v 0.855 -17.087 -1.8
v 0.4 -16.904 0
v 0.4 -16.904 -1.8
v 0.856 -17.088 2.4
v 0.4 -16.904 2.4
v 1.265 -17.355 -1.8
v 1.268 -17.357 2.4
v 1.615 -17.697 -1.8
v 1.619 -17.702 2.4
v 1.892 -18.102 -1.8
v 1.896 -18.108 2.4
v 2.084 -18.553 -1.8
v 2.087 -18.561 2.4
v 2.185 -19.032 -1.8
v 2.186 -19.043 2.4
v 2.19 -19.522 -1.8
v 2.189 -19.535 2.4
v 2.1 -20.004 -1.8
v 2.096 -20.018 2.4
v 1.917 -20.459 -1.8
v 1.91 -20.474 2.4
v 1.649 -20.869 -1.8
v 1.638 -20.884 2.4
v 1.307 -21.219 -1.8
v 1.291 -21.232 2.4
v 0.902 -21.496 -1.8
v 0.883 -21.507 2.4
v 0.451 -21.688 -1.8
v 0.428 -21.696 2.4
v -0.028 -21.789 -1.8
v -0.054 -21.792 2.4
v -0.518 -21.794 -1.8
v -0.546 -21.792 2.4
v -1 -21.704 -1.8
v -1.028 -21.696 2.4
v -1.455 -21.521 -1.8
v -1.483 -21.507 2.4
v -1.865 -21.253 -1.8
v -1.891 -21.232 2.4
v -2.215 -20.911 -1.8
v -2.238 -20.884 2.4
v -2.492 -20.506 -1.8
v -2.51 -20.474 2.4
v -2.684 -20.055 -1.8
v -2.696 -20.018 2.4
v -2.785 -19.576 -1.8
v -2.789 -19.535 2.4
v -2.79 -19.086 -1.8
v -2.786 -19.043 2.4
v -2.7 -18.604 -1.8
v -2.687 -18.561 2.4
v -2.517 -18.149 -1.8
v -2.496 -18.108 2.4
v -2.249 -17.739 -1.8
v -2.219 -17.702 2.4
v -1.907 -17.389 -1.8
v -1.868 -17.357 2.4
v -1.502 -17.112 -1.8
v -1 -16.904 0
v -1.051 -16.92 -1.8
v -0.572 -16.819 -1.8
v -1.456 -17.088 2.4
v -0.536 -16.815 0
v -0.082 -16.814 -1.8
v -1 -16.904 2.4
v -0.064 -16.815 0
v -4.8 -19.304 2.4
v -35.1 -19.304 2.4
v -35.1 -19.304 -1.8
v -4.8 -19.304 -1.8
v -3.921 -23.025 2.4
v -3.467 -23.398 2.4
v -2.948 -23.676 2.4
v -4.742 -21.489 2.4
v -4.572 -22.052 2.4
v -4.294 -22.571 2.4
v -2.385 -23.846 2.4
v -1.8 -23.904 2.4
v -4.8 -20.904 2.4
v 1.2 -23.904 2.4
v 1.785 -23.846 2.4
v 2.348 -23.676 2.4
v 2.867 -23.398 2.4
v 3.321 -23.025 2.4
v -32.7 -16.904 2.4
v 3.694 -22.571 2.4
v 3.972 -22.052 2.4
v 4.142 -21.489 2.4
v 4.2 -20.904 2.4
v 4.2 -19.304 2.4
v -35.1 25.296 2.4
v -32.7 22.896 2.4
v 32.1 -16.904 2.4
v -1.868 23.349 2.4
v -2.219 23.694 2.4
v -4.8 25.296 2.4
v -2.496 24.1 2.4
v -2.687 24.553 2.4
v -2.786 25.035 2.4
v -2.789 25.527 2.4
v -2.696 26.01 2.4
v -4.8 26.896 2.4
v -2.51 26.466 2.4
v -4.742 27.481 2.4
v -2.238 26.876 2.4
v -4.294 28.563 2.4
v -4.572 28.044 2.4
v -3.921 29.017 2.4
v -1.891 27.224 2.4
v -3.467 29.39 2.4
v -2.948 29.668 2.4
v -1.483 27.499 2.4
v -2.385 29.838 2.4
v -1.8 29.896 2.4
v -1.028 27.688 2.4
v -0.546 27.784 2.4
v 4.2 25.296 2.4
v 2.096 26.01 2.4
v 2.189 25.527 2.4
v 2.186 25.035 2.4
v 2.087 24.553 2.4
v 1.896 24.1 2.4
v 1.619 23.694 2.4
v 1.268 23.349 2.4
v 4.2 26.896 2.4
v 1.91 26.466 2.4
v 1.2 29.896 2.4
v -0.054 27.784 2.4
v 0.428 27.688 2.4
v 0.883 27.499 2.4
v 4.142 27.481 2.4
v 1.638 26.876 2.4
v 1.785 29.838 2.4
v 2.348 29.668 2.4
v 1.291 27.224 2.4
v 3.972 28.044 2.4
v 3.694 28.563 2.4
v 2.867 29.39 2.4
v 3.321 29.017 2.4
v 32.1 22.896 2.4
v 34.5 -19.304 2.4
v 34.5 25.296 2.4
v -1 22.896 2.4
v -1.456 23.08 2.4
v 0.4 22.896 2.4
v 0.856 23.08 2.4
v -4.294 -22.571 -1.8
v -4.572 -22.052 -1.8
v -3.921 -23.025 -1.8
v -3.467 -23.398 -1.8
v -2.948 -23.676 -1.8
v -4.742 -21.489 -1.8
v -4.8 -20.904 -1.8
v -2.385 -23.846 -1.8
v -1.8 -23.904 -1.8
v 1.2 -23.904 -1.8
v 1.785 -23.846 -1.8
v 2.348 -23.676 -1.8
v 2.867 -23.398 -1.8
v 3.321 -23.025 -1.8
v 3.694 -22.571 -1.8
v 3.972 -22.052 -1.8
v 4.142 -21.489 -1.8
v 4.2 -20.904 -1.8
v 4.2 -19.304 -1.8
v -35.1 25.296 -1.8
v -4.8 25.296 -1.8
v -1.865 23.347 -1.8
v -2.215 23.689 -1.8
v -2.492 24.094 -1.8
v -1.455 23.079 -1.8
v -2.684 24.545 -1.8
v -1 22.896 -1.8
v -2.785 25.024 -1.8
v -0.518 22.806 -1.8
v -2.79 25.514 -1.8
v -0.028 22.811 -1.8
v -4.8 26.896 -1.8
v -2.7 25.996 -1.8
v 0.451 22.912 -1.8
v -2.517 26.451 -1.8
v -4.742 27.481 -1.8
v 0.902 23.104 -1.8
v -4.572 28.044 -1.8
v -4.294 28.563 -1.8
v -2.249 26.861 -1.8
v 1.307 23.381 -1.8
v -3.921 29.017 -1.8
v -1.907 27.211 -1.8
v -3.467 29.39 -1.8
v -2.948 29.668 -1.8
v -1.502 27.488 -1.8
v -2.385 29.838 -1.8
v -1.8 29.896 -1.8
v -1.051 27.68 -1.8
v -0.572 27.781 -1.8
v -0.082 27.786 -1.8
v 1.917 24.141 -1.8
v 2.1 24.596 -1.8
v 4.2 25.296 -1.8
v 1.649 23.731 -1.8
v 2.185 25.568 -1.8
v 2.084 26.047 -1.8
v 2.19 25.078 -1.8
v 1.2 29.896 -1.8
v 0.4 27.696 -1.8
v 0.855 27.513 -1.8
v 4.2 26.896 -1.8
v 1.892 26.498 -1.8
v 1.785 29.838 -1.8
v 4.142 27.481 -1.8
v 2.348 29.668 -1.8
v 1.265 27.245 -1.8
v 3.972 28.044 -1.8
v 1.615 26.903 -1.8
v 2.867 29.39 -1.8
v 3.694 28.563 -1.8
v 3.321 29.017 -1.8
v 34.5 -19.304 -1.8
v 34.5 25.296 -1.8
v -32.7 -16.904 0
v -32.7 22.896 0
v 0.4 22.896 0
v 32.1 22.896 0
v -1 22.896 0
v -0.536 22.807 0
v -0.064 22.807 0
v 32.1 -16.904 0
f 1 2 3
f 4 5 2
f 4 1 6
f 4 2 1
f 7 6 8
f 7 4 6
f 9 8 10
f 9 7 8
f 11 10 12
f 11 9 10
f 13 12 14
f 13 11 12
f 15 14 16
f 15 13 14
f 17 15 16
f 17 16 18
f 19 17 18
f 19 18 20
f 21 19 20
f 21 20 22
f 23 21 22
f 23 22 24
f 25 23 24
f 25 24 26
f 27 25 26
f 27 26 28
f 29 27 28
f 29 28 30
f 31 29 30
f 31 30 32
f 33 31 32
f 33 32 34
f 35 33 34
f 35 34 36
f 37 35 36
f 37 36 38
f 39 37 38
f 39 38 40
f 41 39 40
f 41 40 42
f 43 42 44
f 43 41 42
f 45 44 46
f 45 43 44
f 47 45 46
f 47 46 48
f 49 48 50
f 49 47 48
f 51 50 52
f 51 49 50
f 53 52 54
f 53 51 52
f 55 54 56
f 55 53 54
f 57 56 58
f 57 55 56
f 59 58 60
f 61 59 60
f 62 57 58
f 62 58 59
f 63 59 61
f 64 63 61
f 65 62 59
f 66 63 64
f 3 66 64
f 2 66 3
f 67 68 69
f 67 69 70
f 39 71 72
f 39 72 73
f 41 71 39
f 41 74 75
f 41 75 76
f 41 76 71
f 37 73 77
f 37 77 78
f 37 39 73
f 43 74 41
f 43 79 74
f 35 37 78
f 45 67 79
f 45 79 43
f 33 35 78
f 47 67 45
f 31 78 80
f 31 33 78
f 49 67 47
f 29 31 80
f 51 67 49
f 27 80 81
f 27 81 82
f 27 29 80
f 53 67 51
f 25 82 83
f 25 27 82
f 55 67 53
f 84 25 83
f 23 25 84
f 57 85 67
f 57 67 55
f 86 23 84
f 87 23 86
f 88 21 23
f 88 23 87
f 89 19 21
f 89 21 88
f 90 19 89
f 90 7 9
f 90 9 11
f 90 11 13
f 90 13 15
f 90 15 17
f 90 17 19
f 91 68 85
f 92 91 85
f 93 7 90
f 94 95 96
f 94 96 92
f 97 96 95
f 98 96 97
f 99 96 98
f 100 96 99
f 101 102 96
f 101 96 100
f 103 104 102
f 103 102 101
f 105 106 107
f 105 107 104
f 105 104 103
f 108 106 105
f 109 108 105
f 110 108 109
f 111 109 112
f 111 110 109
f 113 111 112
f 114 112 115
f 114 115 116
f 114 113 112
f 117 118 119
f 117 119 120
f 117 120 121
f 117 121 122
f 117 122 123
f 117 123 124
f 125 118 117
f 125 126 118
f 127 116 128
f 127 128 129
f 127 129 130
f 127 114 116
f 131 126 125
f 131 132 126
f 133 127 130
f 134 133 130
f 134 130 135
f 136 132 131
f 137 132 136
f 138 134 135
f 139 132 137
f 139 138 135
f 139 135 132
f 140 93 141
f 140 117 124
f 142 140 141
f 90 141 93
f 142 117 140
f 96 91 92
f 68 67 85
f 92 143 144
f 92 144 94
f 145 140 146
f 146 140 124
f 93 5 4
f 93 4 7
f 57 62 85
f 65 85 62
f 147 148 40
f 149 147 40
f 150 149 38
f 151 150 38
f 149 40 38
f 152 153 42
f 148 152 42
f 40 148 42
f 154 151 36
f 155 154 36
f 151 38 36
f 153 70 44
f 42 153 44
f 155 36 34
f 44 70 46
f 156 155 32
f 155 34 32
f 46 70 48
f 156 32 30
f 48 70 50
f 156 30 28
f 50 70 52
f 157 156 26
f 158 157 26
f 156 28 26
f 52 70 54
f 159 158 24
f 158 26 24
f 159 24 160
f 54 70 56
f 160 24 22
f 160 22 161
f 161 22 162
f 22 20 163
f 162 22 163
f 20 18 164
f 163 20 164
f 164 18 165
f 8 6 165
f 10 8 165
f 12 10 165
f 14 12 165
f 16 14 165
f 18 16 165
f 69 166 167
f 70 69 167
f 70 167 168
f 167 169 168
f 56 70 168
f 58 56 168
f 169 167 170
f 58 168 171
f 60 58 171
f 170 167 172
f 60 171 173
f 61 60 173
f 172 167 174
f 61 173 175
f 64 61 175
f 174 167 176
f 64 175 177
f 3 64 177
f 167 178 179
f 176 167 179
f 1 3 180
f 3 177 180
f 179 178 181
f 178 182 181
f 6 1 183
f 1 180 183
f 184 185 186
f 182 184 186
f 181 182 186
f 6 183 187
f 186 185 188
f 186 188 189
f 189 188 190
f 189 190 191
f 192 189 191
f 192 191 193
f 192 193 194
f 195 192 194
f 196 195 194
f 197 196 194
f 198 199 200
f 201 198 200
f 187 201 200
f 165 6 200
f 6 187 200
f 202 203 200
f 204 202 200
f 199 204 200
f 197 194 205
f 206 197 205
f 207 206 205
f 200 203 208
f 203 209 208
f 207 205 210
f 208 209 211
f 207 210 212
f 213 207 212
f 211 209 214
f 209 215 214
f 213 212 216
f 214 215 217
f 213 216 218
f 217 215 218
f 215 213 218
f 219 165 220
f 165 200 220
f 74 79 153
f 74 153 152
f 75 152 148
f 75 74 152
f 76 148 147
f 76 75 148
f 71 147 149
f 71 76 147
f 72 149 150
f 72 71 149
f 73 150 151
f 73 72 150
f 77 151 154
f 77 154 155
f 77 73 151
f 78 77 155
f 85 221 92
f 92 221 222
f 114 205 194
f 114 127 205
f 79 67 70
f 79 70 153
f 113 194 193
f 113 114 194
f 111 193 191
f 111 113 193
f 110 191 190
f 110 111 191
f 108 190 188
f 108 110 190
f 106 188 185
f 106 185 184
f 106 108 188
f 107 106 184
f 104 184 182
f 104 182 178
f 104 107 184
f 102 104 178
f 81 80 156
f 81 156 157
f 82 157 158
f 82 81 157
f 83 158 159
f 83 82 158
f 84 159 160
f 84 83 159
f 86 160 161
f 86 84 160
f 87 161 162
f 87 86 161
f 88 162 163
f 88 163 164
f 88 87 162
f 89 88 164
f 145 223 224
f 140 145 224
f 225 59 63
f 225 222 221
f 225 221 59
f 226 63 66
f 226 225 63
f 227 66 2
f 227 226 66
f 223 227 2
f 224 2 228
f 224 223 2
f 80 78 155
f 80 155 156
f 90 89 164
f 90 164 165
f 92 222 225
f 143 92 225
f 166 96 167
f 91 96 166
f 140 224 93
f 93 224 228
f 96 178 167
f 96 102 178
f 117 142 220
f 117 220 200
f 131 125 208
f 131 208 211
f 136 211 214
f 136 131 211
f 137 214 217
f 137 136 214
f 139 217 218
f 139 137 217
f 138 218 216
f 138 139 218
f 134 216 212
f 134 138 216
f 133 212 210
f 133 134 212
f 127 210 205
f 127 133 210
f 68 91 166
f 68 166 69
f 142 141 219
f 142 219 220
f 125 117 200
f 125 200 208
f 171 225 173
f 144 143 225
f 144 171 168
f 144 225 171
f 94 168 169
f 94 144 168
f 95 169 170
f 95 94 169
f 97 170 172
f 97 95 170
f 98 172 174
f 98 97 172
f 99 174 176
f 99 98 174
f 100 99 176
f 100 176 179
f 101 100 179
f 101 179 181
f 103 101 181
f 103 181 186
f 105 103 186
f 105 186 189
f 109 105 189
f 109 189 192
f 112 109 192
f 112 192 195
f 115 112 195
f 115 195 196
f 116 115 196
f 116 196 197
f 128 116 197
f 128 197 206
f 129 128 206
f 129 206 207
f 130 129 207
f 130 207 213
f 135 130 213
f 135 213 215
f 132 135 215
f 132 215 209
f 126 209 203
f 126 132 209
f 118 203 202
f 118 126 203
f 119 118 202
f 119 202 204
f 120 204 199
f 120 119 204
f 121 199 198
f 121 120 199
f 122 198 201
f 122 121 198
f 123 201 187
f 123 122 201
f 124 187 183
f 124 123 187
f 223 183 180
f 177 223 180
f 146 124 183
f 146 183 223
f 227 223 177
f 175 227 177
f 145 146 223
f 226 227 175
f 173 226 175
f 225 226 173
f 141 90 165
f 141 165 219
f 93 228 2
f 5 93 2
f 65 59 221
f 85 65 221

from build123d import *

# Parameters (mm, degrees)
F1_DEPTH = 2.4
F0_W     = 60
F0_H     = 35
F2_DEPTH = 1.8


# Not quite as in the source:
# - ends of sketch curves that miss each other by under 0.0002 mm in the source are joined


with BuildPart() as f1:
    # F0 (on Top) → F1 (new body)
    with BuildSketch(Plane.XY):
        Polygon((-32.7, -16.904), (-32.7, 22.896), (-4.8, 22.896), (-4.8, 25.2960002601), (-35.1000002601, 25.2960002601), (-35.1000002601, -19.3040002601), (-4.8, -19.3040002601), (-4.8, -16.904), align=None)
        Polygon((4.2, 25.2960002601), (4.2, 22.896), (32.1, 22.896), (32.1, -16.904), (4.2, -16.904), (4.2, -19.3040002601), (34.5000002601, -19.3040002601), (34.5000002601, 25.2960002601), align=None)
        with BuildLine():
            ThreePointArc((2.2, 25.296), (1.7, 23.796), (0.4, 22.896))
            Line((0.4, 22.896), (4.2, 22.896))
            Line((4.2, 22.896), (4.2, 25.2960002601))
            Line((4.2, 25.2960002601), (2.2, 25.296))
        make_face()
        with BuildLine():
            Line((-4.8, 25.2960002601), (-4.8, 22.896))
            Line((-4.8, 22.896), (-1, 22.896))
            ThreePointArc((-1, 22.896), (-2.300000078, 23.796000104), (-2.8, 25.2960002601))
            Line((-2.8, 25.2960002601), (-4.8, 25.2960002601))
        make_face()
        with BuildLine():
            Line((-4.8, 26.896), (-4.8, 25.2960002601))
            Line((-4.8, 25.2960002601), (-2.8, 25.2960002601))
            ThreePointArc((-2.8, 25.2960002601), (-0.2999998699, 27.796), (2.2, 25.296))
            Line((2.2, 25.296), (4.2, 25.2960002601))
            Line((4.2, 25.2960002601), (4.2, 26.896))
            ThreePointArc((4.2, 26.896), (3.3213203436, 29.0173203436), (1.2, 29.896))
            Line((1.2, 29.896), (-1.8, 29.896))
            ThreePointArc((-1.8, 29.896), (-3.9213203436, 29.0173203436), (-4.8, 26.896))
        make_face()
        with BuildLine():
            Line((-1, -16.904), (-4.8, -16.904))
            Line((-4.8, -16.904), (-4.8, -19.3040002601))
            Line((-4.8, -19.3040002601), (-4.8, -20.904))
            ThreePointArc((-4.8, -20.904), (-3.9213203436, -23.0253203436), (-1.8, -23.904))
            Line((-1.8, -23.904), (1.2, -23.904))
            ThreePointArc((1.2, -23.904), (3.3213203436, -23.0253203436), (4.2, -20.904))
            Line((4.2, -20.904), (4.2, -19.3040002601))
            Line((4.2, -19.3040002601), (4.2, -16.904))
            Line((4.2, -16.904), (0.4, -16.904))
            ThreePointArc((0.4, -16.904), (1.7, -17.804), (2.2, -19.304))
            ThreePointArc((2.2, -19.304), (-1.8, -21.304), (-1, -16.904))
        make_face()
    extrude(amount=F1_DEPTH)

    # F0 (on Top) → F2 (join)
    with BuildSketch(Plane.XY):
        Polygon((4.2, 25.2960002601), (4.2, 22.896), (32.1, 22.896), (32.1, -16.904), (4.2, -16.904), (4.2, -19.3040002601), (34.5000002601, -19.3040002601), (34.5000002601, 25.2960002601), align=None)
        with BuildLine():
            Line((-4.8, 22.896), (-32.7, 22.896))
            Line((-32.7, 22.896), (-32.7, -16.904))
            Line((-32.7, -16.904), (-4.8, -16.904))
            Line((-4.8, -16.904), (-1, -16.904))
            ThreePointArc((-1, -16.904), (-0.3, -16.804), (0.4, -16.904))
            Line((0.4, -16.904), (4.2, -16.904))
            Line((4.2, -16.904), (32.1, -16.904))
            Line((32.1, -16.904), (32.1, 22.896))
            Line((32.1, 22.896), (4.2, 22.896))
            Line((4.2, 22.896), (0.4, 22.896))
            ThreePointArc((0.4, 22.896), (-0.3, 22.796), (-1, 22.896))
            Line((-1, 22.896), (-4.8, 22.896))
        make_face()
        with Locations((-0.3, 2.996)):
            Rectangle(F0_W, F0_H, mode=Mode.SUBTRACT)
        with Locations((-0.3, 2.996)):
            Rectangle(F0_W, F0_H)
        Polygon((-32.7, -16.904), (-32.7, 22.896), (-4.8, 22.896), (-4.8, 25.2960002601), (-35.1000002601, 25.2960002601), (-35.1000002601, -19.3040002601), (-4.8, -19.3040002601), (-4.8, -16.904), align=None)
        with BuildLine():
            Line((-1, -16.904), (-4.8, -16.904))
            Line((-4.8, -16.904), (-4.8, -19.3040002601))
            Line((-4.8, -19.3040002601), (-4.8, -20.904))
            ThreePointArc((-4.8, -20.904), (-3.9213203436, -23.0253203436), (-1.8, -23.904))
            Line((-1.8, -23.904), (1.2, -23.904))
            ThreePointArc((1.2, -23.904), (3.3213203436, -23.0253203436), (4.2, -20.904))
            Line((4.2, -20.904), (4.2, -19.3040002601))
            Line((4.2, -19.3040002601), (4.2, -16.904))
            Line((4.2, -16.904), (0.4, -16.904))
            ThreePointArc((0.4, -16.904), (1.7, -17.804), (2.2, -19.304))
            ThreePointArc((2.2, -19.304), (-1.8, -21.304), (-1, -16.904))
        make_face()
        with BuildLine():
            Line((-4.8, 26.896), (-4.8, 25.2960002601))
            Line((-4.8, 25.2960002601), (-2.8, 25.2960002601))
            ThreePointArc((-2.8, 25.2960002601), (-0.2999998699, 27.796), (2.2, 25.296))
            Line((2.2, 25.296), (4.2, 25.2960002601))
            Line((4.2, 25.2960002601), (4.2, 26.896))
            ThreePointArc((4.2, 26.896), (3.3213203436, 29.0173203436), (1.2, 29.896))
            Line((1.2, 29.896), (-1.8, 29.896))
            ThreePointArc((-1.8, 29.896), (-3.9213203436, 29.0173203436), (-4.8, 26.896))
        make_face()
        with BuildLine():
            ThreePointArc((2.2, 25.296), (1.7, 23.796), (0.4, 22.896))
            Line((0.4, 22.896), (4.2, 22.896))
            Line((4.2, 22.896), (4.2, 25.2960002601))
            Line((4.2, 25.2960002601), (2.2, 25.296))
        make_face()
        with BuildLine():
            Line((-4.8, 25.2960002601), (-4.8, 22.896))
            Line((-4.8, 22.896), (-1, 22.896))
            ThreePointArc((-1, 22.896), (-2.300000078, 23.796000104), (-2.8, 25.2960002601))
            Line((-2.8, 25.2960002601), (-4.8, 25.2960002601))
        make_face()
    extrude(amount=-F2_DEPTH)


solid = f1.part
